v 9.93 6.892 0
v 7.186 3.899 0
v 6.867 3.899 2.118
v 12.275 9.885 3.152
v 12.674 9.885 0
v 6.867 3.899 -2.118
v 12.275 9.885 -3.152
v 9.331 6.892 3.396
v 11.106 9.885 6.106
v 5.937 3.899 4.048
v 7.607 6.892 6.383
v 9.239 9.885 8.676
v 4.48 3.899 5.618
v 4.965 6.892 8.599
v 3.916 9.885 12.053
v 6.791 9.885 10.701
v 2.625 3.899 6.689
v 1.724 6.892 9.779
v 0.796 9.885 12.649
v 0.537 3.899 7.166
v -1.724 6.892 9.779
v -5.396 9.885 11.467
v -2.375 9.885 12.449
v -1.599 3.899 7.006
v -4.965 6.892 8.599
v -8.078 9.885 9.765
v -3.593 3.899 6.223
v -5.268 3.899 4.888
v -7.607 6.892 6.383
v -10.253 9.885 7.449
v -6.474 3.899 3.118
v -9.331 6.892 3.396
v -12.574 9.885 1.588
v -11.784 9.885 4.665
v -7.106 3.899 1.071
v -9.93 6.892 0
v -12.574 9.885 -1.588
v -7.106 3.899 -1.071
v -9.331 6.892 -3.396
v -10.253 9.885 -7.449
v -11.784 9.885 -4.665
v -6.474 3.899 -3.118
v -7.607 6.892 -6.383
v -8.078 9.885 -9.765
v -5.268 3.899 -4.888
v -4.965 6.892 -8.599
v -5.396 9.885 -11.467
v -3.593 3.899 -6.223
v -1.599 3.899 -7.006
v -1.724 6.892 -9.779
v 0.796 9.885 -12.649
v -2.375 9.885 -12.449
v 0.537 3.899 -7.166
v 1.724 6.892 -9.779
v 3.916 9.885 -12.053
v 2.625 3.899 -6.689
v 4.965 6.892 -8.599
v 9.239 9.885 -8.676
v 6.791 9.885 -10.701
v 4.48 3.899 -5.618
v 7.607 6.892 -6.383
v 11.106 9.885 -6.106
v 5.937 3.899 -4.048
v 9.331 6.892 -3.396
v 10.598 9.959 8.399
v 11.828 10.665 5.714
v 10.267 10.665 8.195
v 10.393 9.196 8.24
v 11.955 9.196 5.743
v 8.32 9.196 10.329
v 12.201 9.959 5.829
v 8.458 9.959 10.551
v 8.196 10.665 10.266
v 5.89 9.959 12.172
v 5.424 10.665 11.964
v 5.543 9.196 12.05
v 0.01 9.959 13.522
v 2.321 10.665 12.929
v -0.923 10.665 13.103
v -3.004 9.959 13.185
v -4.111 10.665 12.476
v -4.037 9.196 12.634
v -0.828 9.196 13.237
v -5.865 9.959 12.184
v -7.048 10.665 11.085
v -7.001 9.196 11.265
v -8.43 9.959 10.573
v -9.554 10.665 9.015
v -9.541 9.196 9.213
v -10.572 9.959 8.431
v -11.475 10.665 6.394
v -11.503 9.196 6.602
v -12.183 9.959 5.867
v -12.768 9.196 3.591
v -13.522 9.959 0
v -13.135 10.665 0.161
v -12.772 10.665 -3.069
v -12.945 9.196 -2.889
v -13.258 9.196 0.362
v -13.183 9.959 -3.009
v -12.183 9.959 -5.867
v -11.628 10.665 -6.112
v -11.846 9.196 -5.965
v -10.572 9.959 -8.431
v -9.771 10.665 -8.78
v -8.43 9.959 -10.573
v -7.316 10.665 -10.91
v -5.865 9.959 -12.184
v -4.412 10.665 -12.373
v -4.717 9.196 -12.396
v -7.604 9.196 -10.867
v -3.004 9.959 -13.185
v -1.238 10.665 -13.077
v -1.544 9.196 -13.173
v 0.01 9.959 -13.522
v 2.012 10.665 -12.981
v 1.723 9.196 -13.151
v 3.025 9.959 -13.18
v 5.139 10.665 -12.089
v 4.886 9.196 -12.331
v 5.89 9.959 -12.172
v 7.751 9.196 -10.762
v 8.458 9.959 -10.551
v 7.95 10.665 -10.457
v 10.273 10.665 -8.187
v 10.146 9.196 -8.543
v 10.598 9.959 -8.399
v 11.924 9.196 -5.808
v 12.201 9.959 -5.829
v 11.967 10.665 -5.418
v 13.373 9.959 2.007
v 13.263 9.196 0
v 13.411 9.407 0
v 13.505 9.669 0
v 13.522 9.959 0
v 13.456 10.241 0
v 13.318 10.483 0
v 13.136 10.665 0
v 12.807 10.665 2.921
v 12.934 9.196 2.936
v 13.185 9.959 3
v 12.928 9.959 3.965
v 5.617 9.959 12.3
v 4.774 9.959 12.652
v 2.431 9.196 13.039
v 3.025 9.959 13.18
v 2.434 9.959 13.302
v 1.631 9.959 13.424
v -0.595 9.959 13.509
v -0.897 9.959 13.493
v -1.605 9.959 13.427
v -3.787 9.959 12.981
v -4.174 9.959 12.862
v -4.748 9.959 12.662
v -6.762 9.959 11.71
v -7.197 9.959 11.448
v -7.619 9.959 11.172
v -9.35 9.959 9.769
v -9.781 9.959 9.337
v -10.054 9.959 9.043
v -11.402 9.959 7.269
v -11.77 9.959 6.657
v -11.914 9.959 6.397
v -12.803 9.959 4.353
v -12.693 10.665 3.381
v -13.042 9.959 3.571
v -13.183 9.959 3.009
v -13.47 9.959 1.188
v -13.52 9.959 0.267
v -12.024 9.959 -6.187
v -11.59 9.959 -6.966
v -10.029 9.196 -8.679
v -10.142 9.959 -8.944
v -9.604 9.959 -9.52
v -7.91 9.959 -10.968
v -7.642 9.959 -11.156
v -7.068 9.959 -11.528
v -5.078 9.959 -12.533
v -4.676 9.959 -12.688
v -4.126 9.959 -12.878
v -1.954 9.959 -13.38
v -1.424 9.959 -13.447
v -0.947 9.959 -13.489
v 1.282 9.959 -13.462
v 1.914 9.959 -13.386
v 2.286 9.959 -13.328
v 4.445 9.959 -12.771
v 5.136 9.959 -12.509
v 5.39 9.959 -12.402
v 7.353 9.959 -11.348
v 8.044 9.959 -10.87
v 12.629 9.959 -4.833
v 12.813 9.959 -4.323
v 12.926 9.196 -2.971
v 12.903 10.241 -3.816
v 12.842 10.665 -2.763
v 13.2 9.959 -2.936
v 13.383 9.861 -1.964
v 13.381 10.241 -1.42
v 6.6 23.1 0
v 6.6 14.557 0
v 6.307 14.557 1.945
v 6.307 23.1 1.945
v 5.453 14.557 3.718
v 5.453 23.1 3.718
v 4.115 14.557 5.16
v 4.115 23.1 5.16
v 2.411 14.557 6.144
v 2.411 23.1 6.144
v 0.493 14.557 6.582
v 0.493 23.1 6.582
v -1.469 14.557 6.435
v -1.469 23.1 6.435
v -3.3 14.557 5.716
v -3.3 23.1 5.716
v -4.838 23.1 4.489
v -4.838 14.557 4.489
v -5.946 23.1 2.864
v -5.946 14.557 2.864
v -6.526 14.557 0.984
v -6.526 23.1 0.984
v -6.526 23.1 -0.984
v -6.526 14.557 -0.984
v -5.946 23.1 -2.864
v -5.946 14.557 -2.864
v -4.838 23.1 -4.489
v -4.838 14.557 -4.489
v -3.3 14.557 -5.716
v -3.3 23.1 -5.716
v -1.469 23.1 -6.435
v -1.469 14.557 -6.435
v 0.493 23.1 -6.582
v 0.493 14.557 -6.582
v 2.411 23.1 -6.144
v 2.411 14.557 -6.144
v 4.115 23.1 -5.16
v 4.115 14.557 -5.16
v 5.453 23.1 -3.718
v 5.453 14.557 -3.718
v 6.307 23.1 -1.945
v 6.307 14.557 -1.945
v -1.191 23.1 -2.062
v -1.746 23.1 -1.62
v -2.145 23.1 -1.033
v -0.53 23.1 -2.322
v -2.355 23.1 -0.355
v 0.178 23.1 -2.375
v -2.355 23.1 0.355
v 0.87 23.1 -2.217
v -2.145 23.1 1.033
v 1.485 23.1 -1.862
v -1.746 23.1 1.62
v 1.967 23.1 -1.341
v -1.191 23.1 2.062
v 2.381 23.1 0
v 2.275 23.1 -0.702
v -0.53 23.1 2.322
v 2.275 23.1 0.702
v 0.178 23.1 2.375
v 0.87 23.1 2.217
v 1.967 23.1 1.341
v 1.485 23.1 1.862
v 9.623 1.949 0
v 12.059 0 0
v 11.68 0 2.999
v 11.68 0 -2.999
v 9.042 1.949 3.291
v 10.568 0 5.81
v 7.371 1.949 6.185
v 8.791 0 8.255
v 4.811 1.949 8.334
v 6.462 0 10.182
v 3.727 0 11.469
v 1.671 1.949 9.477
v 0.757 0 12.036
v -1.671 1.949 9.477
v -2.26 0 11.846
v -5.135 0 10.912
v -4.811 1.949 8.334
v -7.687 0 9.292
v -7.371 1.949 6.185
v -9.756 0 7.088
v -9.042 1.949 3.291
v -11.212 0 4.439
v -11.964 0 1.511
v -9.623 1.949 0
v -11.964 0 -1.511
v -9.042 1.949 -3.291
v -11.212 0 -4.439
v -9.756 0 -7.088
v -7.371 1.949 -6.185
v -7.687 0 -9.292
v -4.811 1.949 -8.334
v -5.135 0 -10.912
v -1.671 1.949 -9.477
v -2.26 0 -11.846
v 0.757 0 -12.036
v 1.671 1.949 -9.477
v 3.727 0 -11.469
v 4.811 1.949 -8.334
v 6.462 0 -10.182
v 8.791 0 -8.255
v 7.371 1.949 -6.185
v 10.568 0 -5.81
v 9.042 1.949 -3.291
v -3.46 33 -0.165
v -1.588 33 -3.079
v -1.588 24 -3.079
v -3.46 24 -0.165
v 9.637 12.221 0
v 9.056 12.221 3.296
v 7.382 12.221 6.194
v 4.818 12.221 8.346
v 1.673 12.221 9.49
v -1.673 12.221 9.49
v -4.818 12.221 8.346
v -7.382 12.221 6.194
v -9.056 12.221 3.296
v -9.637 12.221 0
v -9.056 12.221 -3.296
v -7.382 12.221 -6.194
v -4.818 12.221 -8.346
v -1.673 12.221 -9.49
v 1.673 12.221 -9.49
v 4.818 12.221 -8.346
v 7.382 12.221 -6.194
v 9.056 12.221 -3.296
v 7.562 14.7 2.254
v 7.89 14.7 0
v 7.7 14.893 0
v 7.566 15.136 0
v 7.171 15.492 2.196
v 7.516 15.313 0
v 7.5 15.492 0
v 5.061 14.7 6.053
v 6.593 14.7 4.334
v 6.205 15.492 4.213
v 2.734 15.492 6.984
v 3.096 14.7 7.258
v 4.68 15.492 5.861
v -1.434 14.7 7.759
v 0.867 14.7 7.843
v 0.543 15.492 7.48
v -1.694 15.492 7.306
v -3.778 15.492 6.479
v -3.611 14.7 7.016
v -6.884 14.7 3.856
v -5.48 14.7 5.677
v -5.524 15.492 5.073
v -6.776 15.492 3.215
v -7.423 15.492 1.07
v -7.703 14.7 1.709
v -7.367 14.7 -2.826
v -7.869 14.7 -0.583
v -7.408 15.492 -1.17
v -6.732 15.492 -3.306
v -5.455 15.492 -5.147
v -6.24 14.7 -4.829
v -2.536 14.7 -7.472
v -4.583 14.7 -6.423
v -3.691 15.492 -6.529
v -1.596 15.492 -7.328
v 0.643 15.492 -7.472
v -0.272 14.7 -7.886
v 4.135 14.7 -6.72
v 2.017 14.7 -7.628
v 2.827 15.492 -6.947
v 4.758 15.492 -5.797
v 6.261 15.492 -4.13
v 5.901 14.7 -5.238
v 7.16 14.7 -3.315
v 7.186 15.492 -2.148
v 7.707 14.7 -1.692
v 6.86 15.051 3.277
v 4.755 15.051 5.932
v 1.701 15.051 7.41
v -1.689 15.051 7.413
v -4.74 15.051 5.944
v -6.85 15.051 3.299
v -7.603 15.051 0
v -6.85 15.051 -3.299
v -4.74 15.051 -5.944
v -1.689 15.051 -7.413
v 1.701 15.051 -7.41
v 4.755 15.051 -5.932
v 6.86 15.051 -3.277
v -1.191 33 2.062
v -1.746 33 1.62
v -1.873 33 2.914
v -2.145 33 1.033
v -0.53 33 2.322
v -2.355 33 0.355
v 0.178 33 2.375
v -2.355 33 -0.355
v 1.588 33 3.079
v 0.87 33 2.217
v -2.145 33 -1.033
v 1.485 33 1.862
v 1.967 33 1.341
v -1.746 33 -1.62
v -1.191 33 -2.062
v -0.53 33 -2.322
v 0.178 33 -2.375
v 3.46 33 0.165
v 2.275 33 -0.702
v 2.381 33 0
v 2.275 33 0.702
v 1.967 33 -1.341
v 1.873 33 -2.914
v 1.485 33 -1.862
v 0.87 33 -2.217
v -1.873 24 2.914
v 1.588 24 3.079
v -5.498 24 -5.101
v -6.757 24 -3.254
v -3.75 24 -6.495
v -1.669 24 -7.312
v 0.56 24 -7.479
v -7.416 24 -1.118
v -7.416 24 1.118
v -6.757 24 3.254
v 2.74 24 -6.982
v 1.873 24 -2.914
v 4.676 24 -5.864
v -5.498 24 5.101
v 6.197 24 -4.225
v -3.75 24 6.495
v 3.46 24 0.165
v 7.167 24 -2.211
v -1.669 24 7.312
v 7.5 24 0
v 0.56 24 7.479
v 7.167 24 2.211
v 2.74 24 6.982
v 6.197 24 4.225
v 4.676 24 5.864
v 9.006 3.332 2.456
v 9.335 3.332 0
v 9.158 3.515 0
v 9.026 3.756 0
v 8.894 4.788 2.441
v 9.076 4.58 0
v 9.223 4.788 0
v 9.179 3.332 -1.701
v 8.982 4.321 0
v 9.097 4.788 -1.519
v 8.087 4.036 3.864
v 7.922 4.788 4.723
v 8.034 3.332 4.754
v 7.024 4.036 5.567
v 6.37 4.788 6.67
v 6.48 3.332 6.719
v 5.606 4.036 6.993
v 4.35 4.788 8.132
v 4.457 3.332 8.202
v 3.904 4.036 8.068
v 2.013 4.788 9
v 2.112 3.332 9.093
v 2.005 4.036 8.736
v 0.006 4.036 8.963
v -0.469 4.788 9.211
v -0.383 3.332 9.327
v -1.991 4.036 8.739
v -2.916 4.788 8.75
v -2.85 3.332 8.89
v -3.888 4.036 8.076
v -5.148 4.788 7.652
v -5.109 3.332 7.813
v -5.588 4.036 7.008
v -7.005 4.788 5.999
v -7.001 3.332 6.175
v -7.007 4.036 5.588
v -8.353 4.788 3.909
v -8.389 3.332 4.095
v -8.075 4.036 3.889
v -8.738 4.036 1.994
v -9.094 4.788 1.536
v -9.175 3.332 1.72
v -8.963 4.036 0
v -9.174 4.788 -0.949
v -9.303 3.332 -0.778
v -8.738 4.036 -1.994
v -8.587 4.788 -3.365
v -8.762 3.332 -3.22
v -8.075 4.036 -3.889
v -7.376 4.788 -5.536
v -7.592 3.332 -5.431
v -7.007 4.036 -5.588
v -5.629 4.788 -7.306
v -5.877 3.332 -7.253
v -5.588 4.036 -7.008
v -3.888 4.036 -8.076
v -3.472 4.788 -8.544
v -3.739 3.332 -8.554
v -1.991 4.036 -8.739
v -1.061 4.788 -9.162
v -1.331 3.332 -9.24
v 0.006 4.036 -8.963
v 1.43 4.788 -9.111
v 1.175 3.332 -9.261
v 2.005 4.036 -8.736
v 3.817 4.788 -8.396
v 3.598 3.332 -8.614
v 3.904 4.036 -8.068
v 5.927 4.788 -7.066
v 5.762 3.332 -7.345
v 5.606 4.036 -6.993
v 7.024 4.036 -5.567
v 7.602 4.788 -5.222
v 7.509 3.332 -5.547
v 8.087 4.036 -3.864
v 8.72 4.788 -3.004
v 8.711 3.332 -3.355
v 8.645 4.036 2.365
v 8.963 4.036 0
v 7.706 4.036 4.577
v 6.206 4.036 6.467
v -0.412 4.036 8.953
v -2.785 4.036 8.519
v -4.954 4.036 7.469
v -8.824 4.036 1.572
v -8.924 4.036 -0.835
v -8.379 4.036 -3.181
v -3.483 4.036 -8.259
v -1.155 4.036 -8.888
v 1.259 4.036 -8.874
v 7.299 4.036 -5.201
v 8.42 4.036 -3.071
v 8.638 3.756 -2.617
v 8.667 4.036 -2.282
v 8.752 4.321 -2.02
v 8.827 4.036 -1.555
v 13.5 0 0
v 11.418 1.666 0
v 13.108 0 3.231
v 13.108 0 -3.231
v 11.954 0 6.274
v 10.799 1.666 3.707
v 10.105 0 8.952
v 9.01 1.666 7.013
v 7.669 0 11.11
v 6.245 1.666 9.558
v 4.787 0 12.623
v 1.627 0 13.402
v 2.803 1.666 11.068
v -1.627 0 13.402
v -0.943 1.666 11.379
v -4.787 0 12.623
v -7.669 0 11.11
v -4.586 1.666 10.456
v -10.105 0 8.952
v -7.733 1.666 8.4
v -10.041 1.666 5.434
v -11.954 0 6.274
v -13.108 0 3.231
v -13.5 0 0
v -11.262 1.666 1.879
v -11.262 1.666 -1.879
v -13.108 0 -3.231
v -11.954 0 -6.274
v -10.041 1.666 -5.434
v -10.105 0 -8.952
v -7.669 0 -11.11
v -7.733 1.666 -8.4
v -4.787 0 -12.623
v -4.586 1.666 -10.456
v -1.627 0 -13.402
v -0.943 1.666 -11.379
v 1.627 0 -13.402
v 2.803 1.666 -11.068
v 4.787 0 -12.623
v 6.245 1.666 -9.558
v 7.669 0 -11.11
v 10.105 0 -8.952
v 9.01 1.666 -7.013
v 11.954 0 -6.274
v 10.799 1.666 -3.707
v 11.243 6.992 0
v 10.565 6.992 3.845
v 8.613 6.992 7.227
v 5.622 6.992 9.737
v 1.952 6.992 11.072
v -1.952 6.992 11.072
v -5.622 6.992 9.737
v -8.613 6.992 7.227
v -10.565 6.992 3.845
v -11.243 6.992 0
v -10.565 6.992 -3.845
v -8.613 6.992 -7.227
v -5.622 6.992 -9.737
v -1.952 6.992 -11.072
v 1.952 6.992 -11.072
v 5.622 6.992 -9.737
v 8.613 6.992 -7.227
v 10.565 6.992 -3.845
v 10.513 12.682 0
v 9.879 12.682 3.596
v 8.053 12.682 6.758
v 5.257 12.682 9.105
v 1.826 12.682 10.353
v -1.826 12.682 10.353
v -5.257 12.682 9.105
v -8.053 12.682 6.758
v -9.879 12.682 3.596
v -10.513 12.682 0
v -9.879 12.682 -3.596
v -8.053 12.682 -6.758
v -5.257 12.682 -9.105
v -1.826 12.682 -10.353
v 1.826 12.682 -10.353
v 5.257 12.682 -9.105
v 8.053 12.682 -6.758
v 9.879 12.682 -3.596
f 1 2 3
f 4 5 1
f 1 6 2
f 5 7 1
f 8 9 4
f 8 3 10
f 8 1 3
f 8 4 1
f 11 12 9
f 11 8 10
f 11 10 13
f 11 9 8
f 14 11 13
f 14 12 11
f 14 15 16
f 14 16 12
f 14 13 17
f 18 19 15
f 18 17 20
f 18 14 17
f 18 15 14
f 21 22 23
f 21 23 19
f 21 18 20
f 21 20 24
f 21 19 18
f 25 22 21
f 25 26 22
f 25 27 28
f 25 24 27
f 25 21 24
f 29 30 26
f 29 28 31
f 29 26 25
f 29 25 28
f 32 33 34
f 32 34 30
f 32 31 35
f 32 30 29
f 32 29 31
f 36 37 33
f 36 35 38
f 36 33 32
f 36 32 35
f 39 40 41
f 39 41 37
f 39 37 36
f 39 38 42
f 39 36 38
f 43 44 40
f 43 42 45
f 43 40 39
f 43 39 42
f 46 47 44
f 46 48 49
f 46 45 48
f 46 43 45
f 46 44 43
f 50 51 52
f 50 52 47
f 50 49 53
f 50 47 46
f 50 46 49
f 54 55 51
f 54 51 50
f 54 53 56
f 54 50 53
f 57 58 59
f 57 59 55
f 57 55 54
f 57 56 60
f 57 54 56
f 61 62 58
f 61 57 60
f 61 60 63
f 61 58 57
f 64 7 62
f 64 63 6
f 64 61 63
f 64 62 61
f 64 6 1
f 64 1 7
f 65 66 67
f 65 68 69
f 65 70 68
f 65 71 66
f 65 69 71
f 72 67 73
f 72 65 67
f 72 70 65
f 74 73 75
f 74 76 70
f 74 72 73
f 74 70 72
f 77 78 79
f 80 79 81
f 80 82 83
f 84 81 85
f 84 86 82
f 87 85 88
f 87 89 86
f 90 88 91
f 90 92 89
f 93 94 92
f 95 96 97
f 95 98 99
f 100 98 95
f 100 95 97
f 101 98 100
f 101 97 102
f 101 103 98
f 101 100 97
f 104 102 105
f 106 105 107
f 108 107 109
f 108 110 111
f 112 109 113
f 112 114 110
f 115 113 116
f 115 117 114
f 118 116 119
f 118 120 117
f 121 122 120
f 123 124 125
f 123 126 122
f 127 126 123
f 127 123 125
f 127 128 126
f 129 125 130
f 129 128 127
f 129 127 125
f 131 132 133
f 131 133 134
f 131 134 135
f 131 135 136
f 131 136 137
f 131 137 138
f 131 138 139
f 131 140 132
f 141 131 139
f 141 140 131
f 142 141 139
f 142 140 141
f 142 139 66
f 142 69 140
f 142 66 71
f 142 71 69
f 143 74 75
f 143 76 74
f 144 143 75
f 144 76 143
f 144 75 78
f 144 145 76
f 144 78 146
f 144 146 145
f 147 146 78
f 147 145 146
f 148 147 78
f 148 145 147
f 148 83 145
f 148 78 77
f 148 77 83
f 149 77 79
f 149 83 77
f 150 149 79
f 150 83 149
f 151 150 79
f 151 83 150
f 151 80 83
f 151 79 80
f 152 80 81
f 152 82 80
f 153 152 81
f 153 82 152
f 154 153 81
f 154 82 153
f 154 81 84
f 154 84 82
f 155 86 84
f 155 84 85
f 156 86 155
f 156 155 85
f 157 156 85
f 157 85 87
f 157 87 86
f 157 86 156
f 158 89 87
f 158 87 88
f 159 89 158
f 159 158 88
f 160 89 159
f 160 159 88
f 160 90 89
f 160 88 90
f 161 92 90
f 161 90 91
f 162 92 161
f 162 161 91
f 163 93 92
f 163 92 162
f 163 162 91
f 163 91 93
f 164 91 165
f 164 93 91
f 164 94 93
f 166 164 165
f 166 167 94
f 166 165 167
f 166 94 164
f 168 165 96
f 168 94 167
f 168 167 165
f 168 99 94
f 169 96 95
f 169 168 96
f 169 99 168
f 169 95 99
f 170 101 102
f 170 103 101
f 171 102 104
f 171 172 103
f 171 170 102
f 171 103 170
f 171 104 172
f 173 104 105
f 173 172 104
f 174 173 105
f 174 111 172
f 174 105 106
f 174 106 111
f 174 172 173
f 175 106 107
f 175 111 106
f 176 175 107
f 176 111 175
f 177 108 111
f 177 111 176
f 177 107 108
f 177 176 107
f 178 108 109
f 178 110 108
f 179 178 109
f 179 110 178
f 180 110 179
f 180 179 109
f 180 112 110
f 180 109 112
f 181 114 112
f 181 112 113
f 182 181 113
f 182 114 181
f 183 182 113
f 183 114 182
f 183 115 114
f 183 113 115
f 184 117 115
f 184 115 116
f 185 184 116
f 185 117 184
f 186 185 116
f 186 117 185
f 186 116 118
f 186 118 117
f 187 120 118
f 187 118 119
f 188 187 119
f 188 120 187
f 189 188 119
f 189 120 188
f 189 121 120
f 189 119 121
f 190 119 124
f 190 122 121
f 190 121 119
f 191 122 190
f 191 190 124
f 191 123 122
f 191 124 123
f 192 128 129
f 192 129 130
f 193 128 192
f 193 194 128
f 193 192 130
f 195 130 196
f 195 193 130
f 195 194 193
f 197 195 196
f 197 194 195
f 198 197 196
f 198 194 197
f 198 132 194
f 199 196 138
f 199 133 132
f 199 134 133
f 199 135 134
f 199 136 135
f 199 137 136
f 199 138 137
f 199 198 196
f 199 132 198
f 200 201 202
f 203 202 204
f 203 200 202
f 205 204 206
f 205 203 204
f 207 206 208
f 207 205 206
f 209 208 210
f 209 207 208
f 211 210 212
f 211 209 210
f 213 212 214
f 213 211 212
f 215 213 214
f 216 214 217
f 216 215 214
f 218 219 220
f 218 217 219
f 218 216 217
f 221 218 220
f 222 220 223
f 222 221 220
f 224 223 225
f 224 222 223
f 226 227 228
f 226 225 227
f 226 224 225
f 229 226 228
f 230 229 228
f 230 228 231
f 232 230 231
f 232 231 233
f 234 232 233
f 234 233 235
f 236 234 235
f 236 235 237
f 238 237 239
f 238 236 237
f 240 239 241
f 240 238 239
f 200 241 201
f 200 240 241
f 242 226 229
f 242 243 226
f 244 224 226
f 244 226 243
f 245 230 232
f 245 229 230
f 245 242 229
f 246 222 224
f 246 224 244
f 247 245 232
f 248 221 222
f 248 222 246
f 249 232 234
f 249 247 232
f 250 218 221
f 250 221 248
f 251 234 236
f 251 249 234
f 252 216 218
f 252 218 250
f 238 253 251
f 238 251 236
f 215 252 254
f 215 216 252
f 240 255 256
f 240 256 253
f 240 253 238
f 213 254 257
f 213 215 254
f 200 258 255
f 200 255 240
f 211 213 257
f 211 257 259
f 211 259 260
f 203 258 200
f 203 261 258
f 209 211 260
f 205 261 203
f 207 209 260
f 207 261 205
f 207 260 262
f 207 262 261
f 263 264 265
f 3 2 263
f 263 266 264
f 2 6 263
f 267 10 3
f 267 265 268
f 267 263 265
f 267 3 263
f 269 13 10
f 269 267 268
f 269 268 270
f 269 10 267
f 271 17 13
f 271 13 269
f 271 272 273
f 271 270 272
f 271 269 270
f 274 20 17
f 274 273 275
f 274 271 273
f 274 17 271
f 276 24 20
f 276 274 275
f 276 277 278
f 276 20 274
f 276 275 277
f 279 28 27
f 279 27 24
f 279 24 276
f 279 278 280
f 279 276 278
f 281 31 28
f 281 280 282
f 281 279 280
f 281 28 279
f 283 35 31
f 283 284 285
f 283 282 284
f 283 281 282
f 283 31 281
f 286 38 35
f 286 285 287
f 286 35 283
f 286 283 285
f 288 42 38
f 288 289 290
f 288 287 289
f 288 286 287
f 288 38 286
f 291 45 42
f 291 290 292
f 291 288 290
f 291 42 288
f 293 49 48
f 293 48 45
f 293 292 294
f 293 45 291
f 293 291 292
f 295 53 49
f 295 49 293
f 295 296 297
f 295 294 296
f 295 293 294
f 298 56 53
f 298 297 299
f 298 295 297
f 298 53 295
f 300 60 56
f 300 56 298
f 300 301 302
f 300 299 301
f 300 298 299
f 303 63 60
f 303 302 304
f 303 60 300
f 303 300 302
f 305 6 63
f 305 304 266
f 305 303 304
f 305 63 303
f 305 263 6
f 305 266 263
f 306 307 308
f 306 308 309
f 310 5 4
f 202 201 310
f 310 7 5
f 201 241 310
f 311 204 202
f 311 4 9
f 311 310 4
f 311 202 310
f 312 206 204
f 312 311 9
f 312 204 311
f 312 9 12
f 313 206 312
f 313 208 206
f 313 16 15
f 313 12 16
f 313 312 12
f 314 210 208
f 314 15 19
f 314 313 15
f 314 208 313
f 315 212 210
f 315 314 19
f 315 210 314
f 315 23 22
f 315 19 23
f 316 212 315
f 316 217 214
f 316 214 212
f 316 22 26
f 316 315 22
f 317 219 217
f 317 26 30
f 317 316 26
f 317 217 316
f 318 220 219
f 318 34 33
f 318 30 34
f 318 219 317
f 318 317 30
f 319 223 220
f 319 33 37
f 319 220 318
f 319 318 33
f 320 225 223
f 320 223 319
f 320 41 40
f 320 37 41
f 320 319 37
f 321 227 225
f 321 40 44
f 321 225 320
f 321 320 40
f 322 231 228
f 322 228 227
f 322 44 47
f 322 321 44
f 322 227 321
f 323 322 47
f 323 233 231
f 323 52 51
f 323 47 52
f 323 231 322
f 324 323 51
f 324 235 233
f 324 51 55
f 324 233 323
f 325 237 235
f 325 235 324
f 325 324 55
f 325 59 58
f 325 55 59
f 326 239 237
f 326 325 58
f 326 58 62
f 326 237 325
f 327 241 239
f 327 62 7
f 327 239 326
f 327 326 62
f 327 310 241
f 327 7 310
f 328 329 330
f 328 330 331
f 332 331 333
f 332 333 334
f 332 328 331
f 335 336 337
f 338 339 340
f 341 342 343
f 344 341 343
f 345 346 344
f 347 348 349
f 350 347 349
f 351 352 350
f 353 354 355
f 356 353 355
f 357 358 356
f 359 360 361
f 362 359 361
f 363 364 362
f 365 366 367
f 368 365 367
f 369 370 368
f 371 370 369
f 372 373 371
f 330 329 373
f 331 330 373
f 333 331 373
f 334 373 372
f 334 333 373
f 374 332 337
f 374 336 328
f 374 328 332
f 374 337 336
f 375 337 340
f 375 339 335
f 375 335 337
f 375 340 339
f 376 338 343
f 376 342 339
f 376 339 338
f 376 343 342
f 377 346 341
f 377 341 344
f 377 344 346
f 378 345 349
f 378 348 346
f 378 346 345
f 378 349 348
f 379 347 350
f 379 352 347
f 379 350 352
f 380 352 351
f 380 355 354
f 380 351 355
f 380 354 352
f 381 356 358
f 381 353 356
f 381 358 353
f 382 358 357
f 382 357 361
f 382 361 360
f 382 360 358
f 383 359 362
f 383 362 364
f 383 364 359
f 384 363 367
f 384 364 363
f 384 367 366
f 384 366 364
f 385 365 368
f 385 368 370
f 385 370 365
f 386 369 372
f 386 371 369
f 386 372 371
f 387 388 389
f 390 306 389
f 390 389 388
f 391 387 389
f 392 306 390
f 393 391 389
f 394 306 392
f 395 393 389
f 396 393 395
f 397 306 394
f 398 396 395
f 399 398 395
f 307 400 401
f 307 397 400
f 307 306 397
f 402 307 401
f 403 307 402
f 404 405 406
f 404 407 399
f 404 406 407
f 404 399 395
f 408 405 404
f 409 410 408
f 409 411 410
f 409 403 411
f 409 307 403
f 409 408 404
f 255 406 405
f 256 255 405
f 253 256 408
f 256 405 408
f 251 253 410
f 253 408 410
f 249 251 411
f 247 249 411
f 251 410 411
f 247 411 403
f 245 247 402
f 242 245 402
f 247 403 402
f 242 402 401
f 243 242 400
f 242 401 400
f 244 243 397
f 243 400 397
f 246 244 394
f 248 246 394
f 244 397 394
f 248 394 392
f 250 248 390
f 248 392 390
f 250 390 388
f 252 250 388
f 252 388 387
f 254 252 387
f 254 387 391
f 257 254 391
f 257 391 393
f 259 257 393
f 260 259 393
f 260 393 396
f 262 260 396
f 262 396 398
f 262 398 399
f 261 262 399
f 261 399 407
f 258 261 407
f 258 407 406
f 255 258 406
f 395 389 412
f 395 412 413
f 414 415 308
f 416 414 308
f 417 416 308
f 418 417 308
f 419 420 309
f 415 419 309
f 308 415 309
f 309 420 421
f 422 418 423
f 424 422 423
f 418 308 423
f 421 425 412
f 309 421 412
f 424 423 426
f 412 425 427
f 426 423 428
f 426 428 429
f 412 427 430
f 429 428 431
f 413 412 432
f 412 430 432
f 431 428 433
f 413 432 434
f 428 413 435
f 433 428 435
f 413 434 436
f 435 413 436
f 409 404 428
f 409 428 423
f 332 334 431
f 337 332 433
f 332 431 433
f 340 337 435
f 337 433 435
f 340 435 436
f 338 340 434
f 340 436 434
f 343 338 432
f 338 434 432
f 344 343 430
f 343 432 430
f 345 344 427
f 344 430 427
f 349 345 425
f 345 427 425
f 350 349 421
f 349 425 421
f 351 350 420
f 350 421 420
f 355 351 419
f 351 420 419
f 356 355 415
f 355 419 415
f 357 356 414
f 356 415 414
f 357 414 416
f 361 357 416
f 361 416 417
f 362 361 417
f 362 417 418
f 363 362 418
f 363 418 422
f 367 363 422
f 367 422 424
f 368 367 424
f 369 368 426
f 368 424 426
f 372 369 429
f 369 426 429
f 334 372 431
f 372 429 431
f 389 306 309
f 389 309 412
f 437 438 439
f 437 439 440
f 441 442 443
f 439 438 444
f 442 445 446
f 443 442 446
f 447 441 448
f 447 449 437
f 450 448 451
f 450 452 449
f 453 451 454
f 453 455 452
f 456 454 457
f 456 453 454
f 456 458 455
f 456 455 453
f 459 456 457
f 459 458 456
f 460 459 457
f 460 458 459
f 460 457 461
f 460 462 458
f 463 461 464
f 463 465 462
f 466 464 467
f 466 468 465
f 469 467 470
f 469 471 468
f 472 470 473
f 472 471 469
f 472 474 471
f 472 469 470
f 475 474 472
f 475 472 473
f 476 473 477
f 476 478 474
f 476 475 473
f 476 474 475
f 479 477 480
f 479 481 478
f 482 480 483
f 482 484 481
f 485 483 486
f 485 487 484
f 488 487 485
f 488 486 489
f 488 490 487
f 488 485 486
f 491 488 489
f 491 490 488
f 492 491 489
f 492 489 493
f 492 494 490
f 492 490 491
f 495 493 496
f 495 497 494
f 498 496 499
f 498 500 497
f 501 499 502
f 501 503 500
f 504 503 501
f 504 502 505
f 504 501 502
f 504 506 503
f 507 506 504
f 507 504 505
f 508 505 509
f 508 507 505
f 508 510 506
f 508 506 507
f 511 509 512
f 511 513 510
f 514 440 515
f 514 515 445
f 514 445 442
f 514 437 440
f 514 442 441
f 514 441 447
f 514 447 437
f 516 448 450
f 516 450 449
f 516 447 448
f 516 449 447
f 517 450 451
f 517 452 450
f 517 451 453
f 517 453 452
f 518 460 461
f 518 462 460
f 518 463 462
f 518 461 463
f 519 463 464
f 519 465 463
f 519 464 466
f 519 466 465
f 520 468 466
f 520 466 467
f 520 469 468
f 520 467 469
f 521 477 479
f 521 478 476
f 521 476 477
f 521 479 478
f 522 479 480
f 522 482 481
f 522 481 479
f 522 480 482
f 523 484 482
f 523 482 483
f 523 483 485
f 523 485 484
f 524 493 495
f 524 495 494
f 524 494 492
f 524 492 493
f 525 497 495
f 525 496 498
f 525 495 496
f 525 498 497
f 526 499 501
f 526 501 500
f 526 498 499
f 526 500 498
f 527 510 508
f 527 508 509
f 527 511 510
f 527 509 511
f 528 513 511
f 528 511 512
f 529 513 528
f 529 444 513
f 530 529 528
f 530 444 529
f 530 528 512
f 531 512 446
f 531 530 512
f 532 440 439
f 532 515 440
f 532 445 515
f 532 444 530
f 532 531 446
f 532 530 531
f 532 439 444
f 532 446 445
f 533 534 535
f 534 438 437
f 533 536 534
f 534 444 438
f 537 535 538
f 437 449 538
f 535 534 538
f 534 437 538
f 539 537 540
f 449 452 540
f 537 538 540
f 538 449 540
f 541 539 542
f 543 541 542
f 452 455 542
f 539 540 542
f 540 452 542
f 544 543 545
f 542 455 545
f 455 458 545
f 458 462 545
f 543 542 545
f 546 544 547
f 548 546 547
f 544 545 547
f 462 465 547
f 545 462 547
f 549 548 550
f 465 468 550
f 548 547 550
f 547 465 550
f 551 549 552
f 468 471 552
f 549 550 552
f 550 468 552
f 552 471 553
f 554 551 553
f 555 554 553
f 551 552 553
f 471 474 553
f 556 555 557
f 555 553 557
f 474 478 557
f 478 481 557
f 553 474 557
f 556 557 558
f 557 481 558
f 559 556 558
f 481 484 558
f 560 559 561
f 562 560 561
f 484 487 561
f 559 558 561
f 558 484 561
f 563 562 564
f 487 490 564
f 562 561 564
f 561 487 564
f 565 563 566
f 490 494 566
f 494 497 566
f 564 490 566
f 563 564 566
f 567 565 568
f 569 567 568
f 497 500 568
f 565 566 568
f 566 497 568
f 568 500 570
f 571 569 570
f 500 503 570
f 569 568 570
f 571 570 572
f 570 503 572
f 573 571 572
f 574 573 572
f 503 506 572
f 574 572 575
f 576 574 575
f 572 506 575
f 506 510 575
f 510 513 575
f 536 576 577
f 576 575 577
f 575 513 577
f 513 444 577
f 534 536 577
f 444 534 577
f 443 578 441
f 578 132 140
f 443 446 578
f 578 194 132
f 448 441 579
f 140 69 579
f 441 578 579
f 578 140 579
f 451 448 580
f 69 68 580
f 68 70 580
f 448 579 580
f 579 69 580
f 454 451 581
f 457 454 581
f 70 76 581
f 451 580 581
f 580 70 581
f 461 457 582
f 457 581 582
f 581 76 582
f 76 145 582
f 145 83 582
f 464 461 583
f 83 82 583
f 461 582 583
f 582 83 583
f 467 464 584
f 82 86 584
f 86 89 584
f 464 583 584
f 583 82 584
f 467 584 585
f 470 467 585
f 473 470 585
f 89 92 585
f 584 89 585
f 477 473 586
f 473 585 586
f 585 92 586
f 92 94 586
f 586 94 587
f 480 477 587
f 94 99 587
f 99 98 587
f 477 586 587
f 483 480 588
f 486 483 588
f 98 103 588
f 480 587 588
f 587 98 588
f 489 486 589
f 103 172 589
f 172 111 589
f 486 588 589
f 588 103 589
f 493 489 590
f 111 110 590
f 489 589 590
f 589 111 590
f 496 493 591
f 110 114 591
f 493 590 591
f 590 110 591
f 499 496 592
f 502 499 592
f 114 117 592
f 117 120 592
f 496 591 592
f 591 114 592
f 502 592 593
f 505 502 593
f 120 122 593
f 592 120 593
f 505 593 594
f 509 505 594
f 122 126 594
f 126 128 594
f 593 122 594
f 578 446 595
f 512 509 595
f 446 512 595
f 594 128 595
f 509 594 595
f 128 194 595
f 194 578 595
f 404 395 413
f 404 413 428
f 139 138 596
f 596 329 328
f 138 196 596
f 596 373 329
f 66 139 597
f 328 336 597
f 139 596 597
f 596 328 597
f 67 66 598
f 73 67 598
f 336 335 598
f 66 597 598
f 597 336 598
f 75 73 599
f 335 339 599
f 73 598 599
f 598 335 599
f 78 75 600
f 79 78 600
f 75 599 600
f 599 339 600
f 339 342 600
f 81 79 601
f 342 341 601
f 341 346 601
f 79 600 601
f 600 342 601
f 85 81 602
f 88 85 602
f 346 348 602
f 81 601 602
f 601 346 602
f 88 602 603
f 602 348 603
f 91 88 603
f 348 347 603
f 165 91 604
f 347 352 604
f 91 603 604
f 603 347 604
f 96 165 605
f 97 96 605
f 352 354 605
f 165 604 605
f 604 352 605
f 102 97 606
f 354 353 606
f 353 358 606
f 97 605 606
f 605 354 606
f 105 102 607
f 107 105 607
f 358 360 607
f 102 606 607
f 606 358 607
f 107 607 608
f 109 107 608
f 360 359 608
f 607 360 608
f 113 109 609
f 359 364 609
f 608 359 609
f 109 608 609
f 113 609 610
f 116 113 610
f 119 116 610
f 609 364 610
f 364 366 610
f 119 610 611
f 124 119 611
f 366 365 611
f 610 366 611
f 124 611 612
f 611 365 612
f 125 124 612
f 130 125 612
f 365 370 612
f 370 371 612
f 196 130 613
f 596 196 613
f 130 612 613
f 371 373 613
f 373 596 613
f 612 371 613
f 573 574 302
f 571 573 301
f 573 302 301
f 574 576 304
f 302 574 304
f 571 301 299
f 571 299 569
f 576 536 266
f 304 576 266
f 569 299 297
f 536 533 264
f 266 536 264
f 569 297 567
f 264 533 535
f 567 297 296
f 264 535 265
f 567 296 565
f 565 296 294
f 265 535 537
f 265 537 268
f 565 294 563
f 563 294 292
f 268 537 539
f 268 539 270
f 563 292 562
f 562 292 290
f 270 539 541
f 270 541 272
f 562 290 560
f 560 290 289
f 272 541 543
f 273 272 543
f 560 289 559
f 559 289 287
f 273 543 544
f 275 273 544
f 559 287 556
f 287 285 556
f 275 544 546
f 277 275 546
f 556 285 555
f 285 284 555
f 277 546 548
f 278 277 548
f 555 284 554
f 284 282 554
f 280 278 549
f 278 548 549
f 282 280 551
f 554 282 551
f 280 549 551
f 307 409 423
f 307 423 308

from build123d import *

# Parameters (mm, degrees)
CASCA1_T                 = -0.9
RESSALTO_EXTRUS_O1_DEPTH = 9
FILETE1_R                = 1
ESBO_O3_R                = 2.38125
CORTE_EXTRUS_O1_DEPTH    = 34.0000001
ESQUISSE1_R              = 6.732461852
ENL_V_MAT_EXTRU_1_DEPTH  = 9


with BuildPart() as part:
    # Esboço1 → Revolução1 (revolve)
    with BuildSketch(Plane.XY):
        Polygon((0, 0), (13.5, 0), (8.5, 4), (14, 10), (7.5, 15), (7.5, 24), (0, 24), align=None)
    revolve(axis=Axis((0, 24, 0), (0, -1, 0)))

    # Casca1
    casca1_openings = [part.faces().sort_by_distance(p)[0] for p in [
        (-13.5, 0, 0),
    ]]
    offset(amount=CASCA1_T, openings=casca1_openings, kind=Kind.INTERSECTION)

    # Esboço2 → Ressalto-extrusão1 (add)
    with BuildSketch(Plane(origin=(0, 24, 0), x_dir=(1, 0, 0), z_dir=(0, 1, 0))):
        Polygon((2.496763598, 3.885808136), (-2.11682676, 4.105164771), (-4.613590359, 0.219356636), (-2.496763598, -3.885808136), (2.11682676, -4.105164771), (4.613590359, -0.219356636), align=None)
    extrude(amount=RESSALTO_EXTRUS_O1_DEPTH)

    # Filete1
    filete1_edges = [part.edges().sort_by_distance(p)[0] for p in [
        (-7.5, 15, 0),
        (-14, 10, 0),
        (-8.5, 4, 0),
    ]]
    fillet(filete1_edges, radius=FILETE1_R)

    # Esboço3 → Corte-extrusão1 (cut, through all)
    with BuildSketch(Plane(origin=(0, 33, 0), x_dir=(1, 0, 0), z_dir=(0, 1, 0))):
        Circle(ESBO_O3_R)
    extrude(amount=-CORTE_EXTRUS_O1_DEPTH, mode=Mode.SUBTRACT)

    # Esquisse1 → Enlèv. mat.-Extru.1 (cut)
    with BuildSketch(Plane(origin=(0, 33, 0), x_dir=(1, 0, 0), z_dir=(0, 1, 0))):
        Circle(ESQUISSE1_R)
        Polygon((1.58762007, -3.078873578), (3.460192769, -0.164517477), (1.872572699, 2.914356102), (-1.58762007, 3.078873578), (-3.460192769, 0.164517477), (-1.872572699, -2.914356102), align=None, mode=Mode.SUBTRACT)
    extrude(amount=-ENL_V_MAT_EXTRU_1_DEPTH, mode=Mode.SUBTRACT)


solid = part.part
